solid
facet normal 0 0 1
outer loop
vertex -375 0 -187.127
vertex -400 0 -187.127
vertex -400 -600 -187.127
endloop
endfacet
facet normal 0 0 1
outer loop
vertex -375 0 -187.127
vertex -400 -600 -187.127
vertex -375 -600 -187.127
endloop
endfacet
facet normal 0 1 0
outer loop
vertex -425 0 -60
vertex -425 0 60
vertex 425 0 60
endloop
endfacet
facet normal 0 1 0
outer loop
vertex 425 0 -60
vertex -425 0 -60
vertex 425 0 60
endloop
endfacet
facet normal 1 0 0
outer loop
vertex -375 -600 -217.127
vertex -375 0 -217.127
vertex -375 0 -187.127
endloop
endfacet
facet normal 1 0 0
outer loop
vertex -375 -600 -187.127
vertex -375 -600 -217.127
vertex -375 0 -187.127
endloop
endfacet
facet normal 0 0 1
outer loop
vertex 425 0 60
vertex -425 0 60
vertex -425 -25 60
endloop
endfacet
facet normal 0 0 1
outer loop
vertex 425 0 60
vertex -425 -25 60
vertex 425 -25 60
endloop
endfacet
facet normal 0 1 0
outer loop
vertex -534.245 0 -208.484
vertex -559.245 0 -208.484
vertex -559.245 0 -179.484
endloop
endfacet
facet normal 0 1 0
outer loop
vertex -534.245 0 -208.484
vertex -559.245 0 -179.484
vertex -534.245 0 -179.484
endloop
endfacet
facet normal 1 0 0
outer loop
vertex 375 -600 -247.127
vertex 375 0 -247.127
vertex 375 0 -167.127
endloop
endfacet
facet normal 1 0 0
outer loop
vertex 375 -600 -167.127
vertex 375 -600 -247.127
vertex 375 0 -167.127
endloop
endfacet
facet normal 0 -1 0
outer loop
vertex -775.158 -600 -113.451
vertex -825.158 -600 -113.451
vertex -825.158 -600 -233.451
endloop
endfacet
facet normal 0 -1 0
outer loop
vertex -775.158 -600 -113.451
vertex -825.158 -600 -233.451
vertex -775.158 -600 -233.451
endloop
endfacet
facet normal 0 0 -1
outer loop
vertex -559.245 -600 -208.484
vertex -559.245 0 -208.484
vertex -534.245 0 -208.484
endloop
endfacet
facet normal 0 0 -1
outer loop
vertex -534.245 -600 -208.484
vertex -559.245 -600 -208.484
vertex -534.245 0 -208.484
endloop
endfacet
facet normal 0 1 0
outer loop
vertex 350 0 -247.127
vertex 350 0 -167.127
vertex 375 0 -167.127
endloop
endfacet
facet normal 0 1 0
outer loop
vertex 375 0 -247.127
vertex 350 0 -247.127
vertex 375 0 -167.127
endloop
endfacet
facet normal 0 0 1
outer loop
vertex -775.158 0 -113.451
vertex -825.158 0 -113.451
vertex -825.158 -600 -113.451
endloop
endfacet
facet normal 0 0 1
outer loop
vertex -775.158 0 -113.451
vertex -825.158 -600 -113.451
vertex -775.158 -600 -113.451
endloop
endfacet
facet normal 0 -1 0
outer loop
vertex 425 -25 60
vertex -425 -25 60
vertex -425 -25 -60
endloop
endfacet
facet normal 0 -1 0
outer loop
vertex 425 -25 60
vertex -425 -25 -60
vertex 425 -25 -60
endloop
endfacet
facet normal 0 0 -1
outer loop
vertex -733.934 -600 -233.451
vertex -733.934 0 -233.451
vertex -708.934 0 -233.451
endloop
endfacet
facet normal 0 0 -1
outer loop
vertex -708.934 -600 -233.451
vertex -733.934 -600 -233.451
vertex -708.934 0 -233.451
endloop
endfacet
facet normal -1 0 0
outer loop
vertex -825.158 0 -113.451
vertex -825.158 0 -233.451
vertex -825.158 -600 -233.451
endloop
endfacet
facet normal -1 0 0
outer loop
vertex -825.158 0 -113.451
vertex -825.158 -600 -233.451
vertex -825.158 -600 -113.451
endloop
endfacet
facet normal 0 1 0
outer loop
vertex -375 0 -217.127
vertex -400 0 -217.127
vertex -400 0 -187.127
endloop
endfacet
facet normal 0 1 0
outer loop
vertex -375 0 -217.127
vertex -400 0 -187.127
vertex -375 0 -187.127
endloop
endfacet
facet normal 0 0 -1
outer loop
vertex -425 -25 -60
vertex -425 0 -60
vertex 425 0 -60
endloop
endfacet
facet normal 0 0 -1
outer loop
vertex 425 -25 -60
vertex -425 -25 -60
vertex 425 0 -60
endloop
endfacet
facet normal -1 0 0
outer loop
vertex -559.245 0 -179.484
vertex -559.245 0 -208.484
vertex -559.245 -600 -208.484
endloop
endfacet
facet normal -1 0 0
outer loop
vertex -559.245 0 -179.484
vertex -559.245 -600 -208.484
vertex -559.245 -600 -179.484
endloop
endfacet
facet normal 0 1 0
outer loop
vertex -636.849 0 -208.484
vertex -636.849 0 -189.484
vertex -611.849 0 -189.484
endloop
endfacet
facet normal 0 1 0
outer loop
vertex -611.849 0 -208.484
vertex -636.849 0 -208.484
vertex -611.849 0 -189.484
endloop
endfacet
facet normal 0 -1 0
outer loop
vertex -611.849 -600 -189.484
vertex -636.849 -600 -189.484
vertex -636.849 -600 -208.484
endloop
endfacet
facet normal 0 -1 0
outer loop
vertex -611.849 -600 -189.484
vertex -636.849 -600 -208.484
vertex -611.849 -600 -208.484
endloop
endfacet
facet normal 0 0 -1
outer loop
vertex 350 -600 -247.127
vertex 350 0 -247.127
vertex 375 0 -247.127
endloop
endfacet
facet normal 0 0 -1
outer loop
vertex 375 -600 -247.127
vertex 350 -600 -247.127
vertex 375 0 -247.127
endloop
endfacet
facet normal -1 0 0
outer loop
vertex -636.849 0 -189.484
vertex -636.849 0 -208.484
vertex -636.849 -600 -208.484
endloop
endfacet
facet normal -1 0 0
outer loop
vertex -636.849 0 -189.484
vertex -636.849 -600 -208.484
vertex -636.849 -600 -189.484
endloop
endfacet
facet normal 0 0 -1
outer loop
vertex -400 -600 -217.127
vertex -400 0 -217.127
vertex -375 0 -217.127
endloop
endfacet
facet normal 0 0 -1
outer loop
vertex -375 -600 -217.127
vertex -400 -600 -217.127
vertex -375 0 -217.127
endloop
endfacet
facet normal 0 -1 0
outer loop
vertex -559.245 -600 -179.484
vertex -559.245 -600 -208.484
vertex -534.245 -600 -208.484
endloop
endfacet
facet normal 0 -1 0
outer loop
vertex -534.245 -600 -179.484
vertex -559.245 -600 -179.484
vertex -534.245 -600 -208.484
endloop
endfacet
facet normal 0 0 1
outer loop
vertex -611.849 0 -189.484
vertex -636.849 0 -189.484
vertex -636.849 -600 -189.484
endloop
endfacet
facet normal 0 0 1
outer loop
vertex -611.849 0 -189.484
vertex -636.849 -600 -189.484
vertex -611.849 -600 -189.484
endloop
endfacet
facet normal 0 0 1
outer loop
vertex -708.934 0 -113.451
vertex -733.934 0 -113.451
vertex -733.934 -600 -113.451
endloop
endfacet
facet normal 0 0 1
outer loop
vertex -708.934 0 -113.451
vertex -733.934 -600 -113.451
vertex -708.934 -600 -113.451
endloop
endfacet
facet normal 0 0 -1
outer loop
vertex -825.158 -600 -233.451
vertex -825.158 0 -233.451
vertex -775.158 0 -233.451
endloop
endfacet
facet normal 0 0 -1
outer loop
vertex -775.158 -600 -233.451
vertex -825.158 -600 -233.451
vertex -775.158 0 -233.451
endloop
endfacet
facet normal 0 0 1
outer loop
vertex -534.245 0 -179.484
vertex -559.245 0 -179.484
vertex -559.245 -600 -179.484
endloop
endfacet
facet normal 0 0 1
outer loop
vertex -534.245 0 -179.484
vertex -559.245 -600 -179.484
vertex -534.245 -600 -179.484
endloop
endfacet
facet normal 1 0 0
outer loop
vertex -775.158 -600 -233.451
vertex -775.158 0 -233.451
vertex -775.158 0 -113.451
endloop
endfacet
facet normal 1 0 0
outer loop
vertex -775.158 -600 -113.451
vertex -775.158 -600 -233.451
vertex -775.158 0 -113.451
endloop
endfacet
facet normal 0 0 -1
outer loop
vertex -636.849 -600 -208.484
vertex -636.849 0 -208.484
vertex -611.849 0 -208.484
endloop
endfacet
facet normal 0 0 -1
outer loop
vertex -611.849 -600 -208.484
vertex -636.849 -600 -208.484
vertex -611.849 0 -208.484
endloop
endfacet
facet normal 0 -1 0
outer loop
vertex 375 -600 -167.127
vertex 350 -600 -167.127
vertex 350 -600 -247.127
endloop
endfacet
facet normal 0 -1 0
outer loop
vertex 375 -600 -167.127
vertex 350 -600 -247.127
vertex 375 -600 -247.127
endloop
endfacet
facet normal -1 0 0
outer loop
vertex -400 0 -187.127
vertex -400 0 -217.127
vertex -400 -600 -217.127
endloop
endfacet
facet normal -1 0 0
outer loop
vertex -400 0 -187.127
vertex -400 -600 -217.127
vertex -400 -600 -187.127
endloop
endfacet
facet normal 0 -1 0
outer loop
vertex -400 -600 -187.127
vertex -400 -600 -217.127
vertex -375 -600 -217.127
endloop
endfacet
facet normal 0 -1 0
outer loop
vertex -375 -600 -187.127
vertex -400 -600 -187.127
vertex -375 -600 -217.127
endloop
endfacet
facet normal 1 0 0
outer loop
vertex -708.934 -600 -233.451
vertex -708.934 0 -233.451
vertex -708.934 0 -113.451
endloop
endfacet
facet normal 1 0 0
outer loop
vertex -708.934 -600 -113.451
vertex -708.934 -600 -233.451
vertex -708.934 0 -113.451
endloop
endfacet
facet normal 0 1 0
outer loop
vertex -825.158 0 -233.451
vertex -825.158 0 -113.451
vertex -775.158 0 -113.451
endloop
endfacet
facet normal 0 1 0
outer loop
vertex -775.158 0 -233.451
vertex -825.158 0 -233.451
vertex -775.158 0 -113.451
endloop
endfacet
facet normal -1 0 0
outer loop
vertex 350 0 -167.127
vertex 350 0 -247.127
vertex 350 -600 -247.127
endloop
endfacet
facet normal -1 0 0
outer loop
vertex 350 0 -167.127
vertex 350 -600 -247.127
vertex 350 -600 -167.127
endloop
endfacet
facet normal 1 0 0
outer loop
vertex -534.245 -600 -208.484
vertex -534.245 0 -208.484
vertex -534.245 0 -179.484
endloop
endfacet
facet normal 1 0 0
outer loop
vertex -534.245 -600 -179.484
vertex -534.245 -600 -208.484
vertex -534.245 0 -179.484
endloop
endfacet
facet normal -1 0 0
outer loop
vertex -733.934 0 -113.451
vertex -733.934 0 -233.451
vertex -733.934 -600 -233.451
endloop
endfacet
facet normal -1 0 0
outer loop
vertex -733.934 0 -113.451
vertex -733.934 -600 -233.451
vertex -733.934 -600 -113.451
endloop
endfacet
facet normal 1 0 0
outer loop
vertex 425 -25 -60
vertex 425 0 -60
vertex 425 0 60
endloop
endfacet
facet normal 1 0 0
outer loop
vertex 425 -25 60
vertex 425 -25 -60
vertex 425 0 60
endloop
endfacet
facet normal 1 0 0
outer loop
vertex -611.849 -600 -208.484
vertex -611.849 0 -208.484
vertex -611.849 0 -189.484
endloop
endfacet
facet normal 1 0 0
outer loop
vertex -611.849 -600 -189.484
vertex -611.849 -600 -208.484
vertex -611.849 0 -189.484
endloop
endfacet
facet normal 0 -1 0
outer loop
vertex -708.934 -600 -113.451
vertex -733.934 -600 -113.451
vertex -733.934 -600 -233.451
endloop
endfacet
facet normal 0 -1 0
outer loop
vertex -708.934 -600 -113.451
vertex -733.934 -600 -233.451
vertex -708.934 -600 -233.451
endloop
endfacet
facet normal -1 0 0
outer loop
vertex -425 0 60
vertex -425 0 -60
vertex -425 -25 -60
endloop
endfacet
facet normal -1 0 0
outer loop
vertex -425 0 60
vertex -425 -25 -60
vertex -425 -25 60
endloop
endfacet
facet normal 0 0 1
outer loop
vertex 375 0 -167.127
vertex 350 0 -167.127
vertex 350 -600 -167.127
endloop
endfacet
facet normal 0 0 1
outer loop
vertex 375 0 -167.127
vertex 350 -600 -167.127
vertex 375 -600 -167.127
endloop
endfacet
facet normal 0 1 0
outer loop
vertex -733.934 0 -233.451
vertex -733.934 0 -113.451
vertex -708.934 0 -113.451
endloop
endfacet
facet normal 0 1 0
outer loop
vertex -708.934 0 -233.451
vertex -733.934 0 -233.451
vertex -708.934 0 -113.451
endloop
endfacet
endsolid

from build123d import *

# Parameters (mm, degrees)
F0_W     = 850
F0_H     = 120
F1_DEPTH = 25
F2_W     = 25
F2_H     = 30
F2_H_2   = 80
F3_DEPTH = 600
F4_W     = 25
F4_H     = 120
F4_H_2   = 19
F4_H_3   = 29
F4_W_2   = 50
F5_DEPTH = 600


with BuildPart() as f1:
    # F0 (on Front) → F1 (new body)
    with BuildSketch(Plane.XZ):
        Rectangle(F0_W, F0_H)
    extrude(amount=F1_DEPTH)


with BuildPart() as f3:
    # F2 (on Front) → F3 (new body)
    with BuildSketch(Plane.XZ):
        with Locations((-387.5, -202.127264)):
            Rectangle(F2_W, F2_H)
        with Locations((362.5, -207.127264)):
            Rectangle(F2_W, F2_H_2)
    extrude(amount=F3_DEPTH)


with BuildPart() as f5:
    # F4 (on Front) → F5 (new body)
    with BuildSketch(Plane.XZ):
        with Locations((-721.43364, -173.450828)):
            Rectangle(F4_W, F4_H)
        with Locations((-624.349403, -198.984158)):
            Rectangle(F4_W, F4_H_2)
        with Locations((-546.745348, -193.984158)):
            Rectangle(F4_W, F4_H_3)
        with Locations((-800.158083, -173.450828)):
            Rectangle(F4_W_2, F4_H)
    extrude(amount=F5_DEPTH)


solid = Compound([f1.part, f3.part, f5.part])
